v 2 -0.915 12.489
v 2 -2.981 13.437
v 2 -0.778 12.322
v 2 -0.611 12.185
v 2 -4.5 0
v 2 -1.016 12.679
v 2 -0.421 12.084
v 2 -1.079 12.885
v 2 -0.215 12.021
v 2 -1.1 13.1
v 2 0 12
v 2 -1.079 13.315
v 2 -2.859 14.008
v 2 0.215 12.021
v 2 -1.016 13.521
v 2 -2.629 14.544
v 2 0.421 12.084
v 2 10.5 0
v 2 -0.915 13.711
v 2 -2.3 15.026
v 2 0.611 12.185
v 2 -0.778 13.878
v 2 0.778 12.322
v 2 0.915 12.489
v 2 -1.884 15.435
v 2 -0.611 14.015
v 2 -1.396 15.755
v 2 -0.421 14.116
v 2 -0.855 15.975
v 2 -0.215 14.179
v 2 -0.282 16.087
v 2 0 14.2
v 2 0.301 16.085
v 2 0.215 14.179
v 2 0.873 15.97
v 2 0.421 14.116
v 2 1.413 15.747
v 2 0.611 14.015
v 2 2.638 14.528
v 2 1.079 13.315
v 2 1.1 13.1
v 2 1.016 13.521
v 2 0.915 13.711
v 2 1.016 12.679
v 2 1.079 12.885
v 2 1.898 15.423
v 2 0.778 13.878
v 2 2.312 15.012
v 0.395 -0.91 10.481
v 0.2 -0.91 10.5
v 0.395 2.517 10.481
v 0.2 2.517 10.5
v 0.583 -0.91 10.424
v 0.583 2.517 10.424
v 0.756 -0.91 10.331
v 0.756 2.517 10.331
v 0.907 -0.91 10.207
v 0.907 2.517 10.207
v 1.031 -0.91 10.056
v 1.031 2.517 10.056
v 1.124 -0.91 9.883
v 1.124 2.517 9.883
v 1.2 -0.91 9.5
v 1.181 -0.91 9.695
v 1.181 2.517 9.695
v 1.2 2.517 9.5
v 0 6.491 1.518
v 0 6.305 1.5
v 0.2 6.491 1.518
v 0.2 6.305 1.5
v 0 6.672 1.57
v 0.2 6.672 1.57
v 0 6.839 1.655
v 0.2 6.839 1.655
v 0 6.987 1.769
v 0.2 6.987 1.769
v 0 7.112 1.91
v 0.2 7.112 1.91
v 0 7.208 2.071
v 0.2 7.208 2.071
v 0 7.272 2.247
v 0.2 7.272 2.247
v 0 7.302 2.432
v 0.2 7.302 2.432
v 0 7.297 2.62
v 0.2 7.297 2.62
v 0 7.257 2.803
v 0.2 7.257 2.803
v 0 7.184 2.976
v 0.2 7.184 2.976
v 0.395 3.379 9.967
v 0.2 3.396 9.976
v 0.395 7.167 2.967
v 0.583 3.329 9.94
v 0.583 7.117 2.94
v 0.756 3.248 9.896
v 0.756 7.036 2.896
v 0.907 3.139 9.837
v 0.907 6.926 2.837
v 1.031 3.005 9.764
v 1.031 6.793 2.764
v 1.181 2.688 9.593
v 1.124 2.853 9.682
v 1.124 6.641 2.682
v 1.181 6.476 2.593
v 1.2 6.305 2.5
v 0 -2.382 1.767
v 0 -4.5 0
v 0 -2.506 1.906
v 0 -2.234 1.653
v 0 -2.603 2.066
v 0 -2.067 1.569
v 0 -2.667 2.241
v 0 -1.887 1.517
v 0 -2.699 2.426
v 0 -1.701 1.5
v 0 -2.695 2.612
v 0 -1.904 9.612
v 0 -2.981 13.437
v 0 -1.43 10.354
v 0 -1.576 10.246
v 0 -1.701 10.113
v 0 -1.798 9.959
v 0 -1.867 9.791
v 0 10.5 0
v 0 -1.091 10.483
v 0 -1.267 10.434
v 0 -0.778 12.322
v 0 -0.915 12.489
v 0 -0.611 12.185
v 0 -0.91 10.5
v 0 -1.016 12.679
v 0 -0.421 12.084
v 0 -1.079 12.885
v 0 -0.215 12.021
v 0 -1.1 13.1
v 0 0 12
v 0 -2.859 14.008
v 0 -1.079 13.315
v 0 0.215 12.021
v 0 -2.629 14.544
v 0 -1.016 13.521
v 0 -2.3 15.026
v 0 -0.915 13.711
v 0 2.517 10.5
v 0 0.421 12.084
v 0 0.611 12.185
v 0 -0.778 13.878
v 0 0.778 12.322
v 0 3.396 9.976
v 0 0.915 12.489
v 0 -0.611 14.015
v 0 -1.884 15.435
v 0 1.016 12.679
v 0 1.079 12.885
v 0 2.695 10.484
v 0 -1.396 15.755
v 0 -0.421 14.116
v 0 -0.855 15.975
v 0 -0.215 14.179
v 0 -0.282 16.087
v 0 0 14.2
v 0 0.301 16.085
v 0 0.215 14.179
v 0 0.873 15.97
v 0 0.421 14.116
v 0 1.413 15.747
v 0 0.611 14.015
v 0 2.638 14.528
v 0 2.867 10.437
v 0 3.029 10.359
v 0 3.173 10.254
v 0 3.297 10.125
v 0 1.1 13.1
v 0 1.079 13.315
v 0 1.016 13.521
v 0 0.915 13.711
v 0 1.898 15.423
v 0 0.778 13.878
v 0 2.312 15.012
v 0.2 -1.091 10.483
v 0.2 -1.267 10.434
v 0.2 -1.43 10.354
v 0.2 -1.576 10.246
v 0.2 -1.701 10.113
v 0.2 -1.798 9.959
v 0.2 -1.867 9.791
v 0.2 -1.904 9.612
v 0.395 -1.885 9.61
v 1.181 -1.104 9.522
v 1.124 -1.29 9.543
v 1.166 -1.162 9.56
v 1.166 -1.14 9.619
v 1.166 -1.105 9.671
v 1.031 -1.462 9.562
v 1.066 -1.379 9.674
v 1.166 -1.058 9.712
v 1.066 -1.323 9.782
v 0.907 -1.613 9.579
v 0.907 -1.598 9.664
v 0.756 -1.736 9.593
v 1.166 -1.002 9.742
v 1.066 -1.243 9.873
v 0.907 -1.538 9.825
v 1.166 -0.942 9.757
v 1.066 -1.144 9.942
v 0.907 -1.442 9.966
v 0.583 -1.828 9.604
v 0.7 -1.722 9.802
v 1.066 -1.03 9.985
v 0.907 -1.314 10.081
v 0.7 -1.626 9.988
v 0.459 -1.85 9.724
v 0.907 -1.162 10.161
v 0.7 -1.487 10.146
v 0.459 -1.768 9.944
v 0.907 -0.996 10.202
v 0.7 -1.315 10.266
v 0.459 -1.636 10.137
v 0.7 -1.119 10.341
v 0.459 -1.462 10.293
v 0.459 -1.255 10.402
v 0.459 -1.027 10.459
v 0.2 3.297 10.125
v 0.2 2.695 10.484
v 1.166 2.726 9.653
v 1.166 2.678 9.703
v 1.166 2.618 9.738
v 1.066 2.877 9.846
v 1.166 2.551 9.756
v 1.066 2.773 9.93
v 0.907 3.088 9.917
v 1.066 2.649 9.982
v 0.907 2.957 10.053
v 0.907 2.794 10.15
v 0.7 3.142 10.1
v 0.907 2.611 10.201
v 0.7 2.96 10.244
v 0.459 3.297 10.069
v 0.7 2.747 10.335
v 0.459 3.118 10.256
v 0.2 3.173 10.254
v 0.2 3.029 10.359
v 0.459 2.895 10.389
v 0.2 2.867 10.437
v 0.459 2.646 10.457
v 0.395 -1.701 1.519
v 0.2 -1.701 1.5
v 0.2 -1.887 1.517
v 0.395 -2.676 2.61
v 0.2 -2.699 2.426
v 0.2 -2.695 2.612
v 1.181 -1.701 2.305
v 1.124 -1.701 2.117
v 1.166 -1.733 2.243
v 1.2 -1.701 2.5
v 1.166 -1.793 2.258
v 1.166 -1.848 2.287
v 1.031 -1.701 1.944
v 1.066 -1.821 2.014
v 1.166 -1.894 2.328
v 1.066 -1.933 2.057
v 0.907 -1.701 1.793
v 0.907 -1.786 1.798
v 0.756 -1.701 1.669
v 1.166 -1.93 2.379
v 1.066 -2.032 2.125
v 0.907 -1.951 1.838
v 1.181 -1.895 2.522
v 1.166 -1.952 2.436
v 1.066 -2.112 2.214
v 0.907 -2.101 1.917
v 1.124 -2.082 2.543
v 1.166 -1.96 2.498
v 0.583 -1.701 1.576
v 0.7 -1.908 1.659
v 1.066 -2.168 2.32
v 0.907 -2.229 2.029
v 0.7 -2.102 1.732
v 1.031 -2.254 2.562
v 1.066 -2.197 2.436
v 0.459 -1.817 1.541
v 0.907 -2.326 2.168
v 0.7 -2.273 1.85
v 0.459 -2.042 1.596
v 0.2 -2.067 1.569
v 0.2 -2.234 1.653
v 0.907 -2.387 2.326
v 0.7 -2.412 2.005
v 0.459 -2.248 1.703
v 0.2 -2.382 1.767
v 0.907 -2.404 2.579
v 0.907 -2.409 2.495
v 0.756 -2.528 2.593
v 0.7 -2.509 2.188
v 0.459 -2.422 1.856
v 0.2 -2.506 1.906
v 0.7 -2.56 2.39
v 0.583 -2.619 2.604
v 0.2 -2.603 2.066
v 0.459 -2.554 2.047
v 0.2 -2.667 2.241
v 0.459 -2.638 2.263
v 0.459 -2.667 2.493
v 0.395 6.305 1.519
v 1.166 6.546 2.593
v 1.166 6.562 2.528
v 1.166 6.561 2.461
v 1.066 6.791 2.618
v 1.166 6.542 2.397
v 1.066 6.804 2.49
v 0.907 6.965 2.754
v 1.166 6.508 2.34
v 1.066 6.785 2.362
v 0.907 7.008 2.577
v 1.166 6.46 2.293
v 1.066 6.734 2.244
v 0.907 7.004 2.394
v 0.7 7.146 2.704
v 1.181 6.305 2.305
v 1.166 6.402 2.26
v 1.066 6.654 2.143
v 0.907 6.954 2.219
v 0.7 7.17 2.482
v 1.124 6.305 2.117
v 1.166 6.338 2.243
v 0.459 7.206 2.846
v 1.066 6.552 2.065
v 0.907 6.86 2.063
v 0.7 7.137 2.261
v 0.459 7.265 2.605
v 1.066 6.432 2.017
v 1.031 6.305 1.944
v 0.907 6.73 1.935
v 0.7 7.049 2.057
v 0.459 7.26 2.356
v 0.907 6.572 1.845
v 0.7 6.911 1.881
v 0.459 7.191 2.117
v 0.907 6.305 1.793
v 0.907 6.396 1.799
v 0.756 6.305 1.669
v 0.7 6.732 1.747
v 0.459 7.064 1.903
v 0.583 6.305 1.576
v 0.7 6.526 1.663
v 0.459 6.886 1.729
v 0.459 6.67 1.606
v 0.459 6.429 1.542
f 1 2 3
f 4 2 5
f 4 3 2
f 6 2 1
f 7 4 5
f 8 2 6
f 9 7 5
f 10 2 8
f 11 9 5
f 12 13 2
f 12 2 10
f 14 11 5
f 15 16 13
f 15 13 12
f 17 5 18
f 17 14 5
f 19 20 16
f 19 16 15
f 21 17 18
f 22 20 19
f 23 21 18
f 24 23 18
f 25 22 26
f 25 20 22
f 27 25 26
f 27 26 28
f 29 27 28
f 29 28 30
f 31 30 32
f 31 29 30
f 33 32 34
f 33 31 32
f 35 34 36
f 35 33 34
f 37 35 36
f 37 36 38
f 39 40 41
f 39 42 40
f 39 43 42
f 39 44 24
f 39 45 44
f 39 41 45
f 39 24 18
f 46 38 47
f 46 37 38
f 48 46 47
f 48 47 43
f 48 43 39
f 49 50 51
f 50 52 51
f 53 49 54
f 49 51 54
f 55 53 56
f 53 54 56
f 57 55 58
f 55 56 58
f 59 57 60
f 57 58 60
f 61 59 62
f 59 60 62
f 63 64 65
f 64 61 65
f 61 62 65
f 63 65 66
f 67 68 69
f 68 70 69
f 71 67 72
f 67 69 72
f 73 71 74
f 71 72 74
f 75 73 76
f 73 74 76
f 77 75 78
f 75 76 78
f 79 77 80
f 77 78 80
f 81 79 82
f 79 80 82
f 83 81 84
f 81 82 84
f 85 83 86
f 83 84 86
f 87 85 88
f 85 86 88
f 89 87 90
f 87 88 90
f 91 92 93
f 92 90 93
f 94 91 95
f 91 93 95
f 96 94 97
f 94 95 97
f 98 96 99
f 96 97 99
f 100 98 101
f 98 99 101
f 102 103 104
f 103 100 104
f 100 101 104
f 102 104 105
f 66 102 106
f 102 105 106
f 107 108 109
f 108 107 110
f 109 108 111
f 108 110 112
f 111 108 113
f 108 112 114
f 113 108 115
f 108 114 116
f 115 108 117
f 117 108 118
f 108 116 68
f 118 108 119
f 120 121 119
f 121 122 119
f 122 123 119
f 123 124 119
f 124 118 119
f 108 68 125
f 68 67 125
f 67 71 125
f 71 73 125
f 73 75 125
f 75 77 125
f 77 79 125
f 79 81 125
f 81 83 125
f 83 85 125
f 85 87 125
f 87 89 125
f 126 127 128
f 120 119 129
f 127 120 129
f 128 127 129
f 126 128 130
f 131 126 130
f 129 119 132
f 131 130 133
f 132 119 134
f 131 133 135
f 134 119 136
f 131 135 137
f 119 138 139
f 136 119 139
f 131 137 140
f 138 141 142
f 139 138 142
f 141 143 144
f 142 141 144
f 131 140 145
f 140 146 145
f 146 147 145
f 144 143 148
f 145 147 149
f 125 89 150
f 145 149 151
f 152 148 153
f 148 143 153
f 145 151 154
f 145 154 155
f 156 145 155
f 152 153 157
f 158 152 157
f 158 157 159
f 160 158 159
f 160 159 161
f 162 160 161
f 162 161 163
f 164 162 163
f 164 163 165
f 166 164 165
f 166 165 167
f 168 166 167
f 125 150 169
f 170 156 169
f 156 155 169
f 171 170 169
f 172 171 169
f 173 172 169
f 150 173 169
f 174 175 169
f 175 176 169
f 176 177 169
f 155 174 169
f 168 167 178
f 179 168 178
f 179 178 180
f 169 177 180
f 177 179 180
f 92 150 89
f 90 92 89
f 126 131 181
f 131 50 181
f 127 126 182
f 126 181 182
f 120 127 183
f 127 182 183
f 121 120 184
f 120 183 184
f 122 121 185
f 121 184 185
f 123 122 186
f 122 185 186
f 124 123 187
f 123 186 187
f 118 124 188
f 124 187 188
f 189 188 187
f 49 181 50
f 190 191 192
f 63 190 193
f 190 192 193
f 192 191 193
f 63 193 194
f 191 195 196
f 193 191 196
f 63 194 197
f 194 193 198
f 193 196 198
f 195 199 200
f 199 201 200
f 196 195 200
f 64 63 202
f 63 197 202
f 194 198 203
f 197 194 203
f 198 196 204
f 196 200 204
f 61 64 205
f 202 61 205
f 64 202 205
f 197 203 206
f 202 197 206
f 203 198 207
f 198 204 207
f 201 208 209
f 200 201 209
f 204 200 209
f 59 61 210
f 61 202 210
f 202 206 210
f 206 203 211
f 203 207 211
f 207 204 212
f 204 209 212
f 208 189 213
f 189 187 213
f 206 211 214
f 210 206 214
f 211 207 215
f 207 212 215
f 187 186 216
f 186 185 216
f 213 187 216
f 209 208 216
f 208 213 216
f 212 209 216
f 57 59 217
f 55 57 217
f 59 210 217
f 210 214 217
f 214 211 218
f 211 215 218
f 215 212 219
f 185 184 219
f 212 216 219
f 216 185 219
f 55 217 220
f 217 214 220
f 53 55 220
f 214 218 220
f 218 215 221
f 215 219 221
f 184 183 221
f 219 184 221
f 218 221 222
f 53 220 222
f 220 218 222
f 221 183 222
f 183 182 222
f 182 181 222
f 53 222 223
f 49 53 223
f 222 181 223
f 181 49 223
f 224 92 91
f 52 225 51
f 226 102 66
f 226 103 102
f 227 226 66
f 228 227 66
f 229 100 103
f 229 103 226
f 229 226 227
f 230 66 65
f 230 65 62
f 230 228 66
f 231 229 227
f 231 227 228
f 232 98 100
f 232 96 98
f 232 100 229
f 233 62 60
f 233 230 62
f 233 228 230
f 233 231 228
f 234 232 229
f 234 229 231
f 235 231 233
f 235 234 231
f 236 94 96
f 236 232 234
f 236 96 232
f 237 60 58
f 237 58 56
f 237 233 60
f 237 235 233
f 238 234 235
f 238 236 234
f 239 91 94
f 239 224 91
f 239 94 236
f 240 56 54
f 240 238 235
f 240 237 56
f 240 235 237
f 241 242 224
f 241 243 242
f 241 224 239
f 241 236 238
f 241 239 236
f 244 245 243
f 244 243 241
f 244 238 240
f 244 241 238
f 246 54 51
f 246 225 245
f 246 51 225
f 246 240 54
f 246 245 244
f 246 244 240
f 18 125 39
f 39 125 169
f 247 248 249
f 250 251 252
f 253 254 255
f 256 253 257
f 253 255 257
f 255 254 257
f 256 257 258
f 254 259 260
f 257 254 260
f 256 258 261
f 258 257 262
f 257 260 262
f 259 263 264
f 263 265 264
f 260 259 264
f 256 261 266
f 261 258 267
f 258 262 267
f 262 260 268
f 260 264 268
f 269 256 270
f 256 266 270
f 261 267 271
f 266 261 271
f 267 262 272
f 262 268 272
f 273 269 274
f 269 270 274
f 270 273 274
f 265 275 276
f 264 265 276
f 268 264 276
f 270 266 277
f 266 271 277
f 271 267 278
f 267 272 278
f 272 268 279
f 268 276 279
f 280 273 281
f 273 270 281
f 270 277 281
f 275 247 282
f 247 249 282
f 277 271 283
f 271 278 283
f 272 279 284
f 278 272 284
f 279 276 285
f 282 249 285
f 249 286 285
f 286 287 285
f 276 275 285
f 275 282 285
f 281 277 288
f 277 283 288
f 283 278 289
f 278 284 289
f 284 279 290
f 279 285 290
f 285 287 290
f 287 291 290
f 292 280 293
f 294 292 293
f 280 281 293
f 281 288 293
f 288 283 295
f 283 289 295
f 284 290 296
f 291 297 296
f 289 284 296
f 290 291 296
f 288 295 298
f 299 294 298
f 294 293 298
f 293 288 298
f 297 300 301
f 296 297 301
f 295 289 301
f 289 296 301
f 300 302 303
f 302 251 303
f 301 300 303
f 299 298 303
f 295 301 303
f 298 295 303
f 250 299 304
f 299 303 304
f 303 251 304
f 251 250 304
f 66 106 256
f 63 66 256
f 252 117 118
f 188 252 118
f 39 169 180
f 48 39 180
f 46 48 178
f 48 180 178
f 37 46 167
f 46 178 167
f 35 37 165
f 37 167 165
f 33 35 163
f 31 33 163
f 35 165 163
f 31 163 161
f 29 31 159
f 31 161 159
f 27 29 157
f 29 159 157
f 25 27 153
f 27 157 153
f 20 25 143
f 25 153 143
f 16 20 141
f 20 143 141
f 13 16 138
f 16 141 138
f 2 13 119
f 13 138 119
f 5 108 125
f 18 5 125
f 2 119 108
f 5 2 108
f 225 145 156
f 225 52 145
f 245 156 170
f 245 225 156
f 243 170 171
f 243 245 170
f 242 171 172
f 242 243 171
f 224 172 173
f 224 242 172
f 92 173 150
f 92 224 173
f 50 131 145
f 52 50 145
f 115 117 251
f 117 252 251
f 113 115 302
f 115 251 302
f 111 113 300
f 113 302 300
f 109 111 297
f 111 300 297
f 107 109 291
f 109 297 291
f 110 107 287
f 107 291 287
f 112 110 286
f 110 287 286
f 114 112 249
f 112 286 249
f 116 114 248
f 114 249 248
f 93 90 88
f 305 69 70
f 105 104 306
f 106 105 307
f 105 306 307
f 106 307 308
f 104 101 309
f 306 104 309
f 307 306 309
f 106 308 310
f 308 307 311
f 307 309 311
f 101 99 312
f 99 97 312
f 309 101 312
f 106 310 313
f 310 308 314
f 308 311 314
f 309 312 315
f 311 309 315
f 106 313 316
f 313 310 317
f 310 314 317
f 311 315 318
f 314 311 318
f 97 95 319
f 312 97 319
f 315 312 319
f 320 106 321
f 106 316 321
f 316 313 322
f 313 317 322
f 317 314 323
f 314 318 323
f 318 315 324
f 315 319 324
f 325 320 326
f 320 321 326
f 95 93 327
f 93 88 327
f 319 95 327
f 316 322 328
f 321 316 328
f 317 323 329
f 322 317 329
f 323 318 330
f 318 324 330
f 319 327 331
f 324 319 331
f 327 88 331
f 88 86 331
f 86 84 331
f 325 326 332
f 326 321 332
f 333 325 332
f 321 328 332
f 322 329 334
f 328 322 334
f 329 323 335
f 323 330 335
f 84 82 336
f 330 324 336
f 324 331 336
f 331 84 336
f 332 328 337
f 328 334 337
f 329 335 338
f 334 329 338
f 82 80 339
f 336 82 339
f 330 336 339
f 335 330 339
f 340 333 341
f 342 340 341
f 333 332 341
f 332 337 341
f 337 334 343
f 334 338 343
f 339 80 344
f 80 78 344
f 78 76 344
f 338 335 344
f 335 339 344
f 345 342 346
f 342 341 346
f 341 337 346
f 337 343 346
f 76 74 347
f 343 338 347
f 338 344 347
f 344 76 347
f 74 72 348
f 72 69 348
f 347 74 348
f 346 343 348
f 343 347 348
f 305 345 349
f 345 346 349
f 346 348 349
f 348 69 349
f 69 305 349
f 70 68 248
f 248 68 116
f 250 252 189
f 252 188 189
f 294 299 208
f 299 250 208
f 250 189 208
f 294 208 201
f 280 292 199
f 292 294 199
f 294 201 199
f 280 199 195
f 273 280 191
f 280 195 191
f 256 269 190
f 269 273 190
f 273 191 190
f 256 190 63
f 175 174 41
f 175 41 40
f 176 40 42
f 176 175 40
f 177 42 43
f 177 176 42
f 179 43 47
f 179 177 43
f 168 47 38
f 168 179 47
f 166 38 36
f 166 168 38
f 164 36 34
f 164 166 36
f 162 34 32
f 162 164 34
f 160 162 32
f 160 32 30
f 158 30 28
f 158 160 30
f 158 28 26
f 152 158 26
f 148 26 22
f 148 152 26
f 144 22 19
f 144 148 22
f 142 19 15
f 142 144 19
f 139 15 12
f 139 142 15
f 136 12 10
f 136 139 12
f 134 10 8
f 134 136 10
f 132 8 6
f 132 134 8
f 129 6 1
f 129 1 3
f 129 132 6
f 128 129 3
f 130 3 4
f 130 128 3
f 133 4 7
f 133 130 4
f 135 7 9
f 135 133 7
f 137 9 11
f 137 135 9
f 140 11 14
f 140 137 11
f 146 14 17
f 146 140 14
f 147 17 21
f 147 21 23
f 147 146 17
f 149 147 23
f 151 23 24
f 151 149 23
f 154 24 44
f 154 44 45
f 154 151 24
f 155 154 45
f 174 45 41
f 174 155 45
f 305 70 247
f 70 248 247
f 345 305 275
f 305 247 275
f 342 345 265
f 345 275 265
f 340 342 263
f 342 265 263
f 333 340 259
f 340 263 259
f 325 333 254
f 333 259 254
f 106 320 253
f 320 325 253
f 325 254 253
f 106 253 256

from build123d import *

# Parameters (mm, degrees)
F0_R     = 1.1
F1_DEPTH = 2
F3_DEPTH = 1.2
F4_R     = 1


with BuildPart() as f1:
    # F0 (on Right) → F1 (new body)
    with BuildSketch(Plane.YZ):
        with BuildLine():
            Line((-4.5, 0), (10.5, 0))
            Line((10.5, 0), (2.638459, 14.527772))
            ThreePointArc((2.638459, 14.527772), (-0.571654, 16.045032), (-2.981013, 13.436989))
            Line((-2.981013, 13.436989), (-4.5, 0))
        make_face()
        with Locations((0, 13.1)):
            Circle(F0_R, mode=Mode.SUBTRACT)
    extrude(amount=F1_DEPTH)

    # F2 (on face) → F3 (cut)
    with BuildSketch(Plane(origin=(0, 0, 0), x_dir=(0, -1, 0), z_dir=(-1, 0, 0))):
        Polygon((-3.112502, 10.5), (-7.982751, 1.5), (2.820878, 1.5), (1.803471, 10.5), align=None)
    extrude(amount=-F3_DEPTH, mode=Mode.SUBTRACT)

    # F4
    f4_edges = [f1.edges().sort_by_distance(p)[0] for p in [
        (0.6, 3.112502, 10.5),
        (0.6, -1.803471, 10.5),
        (0.6, -2.820878, 1.5),
        (0.6, 7.982751, 1.5),
        (1.2, 5.547626, 6),
        (1.2, 2.580936, 1.5),
        (1.2, -2.312175, 6),
        (1.2, 0.654515, 10.5),
    ]]
    fillet(f4_edges, radius=F4_R)


solid = f1.part
